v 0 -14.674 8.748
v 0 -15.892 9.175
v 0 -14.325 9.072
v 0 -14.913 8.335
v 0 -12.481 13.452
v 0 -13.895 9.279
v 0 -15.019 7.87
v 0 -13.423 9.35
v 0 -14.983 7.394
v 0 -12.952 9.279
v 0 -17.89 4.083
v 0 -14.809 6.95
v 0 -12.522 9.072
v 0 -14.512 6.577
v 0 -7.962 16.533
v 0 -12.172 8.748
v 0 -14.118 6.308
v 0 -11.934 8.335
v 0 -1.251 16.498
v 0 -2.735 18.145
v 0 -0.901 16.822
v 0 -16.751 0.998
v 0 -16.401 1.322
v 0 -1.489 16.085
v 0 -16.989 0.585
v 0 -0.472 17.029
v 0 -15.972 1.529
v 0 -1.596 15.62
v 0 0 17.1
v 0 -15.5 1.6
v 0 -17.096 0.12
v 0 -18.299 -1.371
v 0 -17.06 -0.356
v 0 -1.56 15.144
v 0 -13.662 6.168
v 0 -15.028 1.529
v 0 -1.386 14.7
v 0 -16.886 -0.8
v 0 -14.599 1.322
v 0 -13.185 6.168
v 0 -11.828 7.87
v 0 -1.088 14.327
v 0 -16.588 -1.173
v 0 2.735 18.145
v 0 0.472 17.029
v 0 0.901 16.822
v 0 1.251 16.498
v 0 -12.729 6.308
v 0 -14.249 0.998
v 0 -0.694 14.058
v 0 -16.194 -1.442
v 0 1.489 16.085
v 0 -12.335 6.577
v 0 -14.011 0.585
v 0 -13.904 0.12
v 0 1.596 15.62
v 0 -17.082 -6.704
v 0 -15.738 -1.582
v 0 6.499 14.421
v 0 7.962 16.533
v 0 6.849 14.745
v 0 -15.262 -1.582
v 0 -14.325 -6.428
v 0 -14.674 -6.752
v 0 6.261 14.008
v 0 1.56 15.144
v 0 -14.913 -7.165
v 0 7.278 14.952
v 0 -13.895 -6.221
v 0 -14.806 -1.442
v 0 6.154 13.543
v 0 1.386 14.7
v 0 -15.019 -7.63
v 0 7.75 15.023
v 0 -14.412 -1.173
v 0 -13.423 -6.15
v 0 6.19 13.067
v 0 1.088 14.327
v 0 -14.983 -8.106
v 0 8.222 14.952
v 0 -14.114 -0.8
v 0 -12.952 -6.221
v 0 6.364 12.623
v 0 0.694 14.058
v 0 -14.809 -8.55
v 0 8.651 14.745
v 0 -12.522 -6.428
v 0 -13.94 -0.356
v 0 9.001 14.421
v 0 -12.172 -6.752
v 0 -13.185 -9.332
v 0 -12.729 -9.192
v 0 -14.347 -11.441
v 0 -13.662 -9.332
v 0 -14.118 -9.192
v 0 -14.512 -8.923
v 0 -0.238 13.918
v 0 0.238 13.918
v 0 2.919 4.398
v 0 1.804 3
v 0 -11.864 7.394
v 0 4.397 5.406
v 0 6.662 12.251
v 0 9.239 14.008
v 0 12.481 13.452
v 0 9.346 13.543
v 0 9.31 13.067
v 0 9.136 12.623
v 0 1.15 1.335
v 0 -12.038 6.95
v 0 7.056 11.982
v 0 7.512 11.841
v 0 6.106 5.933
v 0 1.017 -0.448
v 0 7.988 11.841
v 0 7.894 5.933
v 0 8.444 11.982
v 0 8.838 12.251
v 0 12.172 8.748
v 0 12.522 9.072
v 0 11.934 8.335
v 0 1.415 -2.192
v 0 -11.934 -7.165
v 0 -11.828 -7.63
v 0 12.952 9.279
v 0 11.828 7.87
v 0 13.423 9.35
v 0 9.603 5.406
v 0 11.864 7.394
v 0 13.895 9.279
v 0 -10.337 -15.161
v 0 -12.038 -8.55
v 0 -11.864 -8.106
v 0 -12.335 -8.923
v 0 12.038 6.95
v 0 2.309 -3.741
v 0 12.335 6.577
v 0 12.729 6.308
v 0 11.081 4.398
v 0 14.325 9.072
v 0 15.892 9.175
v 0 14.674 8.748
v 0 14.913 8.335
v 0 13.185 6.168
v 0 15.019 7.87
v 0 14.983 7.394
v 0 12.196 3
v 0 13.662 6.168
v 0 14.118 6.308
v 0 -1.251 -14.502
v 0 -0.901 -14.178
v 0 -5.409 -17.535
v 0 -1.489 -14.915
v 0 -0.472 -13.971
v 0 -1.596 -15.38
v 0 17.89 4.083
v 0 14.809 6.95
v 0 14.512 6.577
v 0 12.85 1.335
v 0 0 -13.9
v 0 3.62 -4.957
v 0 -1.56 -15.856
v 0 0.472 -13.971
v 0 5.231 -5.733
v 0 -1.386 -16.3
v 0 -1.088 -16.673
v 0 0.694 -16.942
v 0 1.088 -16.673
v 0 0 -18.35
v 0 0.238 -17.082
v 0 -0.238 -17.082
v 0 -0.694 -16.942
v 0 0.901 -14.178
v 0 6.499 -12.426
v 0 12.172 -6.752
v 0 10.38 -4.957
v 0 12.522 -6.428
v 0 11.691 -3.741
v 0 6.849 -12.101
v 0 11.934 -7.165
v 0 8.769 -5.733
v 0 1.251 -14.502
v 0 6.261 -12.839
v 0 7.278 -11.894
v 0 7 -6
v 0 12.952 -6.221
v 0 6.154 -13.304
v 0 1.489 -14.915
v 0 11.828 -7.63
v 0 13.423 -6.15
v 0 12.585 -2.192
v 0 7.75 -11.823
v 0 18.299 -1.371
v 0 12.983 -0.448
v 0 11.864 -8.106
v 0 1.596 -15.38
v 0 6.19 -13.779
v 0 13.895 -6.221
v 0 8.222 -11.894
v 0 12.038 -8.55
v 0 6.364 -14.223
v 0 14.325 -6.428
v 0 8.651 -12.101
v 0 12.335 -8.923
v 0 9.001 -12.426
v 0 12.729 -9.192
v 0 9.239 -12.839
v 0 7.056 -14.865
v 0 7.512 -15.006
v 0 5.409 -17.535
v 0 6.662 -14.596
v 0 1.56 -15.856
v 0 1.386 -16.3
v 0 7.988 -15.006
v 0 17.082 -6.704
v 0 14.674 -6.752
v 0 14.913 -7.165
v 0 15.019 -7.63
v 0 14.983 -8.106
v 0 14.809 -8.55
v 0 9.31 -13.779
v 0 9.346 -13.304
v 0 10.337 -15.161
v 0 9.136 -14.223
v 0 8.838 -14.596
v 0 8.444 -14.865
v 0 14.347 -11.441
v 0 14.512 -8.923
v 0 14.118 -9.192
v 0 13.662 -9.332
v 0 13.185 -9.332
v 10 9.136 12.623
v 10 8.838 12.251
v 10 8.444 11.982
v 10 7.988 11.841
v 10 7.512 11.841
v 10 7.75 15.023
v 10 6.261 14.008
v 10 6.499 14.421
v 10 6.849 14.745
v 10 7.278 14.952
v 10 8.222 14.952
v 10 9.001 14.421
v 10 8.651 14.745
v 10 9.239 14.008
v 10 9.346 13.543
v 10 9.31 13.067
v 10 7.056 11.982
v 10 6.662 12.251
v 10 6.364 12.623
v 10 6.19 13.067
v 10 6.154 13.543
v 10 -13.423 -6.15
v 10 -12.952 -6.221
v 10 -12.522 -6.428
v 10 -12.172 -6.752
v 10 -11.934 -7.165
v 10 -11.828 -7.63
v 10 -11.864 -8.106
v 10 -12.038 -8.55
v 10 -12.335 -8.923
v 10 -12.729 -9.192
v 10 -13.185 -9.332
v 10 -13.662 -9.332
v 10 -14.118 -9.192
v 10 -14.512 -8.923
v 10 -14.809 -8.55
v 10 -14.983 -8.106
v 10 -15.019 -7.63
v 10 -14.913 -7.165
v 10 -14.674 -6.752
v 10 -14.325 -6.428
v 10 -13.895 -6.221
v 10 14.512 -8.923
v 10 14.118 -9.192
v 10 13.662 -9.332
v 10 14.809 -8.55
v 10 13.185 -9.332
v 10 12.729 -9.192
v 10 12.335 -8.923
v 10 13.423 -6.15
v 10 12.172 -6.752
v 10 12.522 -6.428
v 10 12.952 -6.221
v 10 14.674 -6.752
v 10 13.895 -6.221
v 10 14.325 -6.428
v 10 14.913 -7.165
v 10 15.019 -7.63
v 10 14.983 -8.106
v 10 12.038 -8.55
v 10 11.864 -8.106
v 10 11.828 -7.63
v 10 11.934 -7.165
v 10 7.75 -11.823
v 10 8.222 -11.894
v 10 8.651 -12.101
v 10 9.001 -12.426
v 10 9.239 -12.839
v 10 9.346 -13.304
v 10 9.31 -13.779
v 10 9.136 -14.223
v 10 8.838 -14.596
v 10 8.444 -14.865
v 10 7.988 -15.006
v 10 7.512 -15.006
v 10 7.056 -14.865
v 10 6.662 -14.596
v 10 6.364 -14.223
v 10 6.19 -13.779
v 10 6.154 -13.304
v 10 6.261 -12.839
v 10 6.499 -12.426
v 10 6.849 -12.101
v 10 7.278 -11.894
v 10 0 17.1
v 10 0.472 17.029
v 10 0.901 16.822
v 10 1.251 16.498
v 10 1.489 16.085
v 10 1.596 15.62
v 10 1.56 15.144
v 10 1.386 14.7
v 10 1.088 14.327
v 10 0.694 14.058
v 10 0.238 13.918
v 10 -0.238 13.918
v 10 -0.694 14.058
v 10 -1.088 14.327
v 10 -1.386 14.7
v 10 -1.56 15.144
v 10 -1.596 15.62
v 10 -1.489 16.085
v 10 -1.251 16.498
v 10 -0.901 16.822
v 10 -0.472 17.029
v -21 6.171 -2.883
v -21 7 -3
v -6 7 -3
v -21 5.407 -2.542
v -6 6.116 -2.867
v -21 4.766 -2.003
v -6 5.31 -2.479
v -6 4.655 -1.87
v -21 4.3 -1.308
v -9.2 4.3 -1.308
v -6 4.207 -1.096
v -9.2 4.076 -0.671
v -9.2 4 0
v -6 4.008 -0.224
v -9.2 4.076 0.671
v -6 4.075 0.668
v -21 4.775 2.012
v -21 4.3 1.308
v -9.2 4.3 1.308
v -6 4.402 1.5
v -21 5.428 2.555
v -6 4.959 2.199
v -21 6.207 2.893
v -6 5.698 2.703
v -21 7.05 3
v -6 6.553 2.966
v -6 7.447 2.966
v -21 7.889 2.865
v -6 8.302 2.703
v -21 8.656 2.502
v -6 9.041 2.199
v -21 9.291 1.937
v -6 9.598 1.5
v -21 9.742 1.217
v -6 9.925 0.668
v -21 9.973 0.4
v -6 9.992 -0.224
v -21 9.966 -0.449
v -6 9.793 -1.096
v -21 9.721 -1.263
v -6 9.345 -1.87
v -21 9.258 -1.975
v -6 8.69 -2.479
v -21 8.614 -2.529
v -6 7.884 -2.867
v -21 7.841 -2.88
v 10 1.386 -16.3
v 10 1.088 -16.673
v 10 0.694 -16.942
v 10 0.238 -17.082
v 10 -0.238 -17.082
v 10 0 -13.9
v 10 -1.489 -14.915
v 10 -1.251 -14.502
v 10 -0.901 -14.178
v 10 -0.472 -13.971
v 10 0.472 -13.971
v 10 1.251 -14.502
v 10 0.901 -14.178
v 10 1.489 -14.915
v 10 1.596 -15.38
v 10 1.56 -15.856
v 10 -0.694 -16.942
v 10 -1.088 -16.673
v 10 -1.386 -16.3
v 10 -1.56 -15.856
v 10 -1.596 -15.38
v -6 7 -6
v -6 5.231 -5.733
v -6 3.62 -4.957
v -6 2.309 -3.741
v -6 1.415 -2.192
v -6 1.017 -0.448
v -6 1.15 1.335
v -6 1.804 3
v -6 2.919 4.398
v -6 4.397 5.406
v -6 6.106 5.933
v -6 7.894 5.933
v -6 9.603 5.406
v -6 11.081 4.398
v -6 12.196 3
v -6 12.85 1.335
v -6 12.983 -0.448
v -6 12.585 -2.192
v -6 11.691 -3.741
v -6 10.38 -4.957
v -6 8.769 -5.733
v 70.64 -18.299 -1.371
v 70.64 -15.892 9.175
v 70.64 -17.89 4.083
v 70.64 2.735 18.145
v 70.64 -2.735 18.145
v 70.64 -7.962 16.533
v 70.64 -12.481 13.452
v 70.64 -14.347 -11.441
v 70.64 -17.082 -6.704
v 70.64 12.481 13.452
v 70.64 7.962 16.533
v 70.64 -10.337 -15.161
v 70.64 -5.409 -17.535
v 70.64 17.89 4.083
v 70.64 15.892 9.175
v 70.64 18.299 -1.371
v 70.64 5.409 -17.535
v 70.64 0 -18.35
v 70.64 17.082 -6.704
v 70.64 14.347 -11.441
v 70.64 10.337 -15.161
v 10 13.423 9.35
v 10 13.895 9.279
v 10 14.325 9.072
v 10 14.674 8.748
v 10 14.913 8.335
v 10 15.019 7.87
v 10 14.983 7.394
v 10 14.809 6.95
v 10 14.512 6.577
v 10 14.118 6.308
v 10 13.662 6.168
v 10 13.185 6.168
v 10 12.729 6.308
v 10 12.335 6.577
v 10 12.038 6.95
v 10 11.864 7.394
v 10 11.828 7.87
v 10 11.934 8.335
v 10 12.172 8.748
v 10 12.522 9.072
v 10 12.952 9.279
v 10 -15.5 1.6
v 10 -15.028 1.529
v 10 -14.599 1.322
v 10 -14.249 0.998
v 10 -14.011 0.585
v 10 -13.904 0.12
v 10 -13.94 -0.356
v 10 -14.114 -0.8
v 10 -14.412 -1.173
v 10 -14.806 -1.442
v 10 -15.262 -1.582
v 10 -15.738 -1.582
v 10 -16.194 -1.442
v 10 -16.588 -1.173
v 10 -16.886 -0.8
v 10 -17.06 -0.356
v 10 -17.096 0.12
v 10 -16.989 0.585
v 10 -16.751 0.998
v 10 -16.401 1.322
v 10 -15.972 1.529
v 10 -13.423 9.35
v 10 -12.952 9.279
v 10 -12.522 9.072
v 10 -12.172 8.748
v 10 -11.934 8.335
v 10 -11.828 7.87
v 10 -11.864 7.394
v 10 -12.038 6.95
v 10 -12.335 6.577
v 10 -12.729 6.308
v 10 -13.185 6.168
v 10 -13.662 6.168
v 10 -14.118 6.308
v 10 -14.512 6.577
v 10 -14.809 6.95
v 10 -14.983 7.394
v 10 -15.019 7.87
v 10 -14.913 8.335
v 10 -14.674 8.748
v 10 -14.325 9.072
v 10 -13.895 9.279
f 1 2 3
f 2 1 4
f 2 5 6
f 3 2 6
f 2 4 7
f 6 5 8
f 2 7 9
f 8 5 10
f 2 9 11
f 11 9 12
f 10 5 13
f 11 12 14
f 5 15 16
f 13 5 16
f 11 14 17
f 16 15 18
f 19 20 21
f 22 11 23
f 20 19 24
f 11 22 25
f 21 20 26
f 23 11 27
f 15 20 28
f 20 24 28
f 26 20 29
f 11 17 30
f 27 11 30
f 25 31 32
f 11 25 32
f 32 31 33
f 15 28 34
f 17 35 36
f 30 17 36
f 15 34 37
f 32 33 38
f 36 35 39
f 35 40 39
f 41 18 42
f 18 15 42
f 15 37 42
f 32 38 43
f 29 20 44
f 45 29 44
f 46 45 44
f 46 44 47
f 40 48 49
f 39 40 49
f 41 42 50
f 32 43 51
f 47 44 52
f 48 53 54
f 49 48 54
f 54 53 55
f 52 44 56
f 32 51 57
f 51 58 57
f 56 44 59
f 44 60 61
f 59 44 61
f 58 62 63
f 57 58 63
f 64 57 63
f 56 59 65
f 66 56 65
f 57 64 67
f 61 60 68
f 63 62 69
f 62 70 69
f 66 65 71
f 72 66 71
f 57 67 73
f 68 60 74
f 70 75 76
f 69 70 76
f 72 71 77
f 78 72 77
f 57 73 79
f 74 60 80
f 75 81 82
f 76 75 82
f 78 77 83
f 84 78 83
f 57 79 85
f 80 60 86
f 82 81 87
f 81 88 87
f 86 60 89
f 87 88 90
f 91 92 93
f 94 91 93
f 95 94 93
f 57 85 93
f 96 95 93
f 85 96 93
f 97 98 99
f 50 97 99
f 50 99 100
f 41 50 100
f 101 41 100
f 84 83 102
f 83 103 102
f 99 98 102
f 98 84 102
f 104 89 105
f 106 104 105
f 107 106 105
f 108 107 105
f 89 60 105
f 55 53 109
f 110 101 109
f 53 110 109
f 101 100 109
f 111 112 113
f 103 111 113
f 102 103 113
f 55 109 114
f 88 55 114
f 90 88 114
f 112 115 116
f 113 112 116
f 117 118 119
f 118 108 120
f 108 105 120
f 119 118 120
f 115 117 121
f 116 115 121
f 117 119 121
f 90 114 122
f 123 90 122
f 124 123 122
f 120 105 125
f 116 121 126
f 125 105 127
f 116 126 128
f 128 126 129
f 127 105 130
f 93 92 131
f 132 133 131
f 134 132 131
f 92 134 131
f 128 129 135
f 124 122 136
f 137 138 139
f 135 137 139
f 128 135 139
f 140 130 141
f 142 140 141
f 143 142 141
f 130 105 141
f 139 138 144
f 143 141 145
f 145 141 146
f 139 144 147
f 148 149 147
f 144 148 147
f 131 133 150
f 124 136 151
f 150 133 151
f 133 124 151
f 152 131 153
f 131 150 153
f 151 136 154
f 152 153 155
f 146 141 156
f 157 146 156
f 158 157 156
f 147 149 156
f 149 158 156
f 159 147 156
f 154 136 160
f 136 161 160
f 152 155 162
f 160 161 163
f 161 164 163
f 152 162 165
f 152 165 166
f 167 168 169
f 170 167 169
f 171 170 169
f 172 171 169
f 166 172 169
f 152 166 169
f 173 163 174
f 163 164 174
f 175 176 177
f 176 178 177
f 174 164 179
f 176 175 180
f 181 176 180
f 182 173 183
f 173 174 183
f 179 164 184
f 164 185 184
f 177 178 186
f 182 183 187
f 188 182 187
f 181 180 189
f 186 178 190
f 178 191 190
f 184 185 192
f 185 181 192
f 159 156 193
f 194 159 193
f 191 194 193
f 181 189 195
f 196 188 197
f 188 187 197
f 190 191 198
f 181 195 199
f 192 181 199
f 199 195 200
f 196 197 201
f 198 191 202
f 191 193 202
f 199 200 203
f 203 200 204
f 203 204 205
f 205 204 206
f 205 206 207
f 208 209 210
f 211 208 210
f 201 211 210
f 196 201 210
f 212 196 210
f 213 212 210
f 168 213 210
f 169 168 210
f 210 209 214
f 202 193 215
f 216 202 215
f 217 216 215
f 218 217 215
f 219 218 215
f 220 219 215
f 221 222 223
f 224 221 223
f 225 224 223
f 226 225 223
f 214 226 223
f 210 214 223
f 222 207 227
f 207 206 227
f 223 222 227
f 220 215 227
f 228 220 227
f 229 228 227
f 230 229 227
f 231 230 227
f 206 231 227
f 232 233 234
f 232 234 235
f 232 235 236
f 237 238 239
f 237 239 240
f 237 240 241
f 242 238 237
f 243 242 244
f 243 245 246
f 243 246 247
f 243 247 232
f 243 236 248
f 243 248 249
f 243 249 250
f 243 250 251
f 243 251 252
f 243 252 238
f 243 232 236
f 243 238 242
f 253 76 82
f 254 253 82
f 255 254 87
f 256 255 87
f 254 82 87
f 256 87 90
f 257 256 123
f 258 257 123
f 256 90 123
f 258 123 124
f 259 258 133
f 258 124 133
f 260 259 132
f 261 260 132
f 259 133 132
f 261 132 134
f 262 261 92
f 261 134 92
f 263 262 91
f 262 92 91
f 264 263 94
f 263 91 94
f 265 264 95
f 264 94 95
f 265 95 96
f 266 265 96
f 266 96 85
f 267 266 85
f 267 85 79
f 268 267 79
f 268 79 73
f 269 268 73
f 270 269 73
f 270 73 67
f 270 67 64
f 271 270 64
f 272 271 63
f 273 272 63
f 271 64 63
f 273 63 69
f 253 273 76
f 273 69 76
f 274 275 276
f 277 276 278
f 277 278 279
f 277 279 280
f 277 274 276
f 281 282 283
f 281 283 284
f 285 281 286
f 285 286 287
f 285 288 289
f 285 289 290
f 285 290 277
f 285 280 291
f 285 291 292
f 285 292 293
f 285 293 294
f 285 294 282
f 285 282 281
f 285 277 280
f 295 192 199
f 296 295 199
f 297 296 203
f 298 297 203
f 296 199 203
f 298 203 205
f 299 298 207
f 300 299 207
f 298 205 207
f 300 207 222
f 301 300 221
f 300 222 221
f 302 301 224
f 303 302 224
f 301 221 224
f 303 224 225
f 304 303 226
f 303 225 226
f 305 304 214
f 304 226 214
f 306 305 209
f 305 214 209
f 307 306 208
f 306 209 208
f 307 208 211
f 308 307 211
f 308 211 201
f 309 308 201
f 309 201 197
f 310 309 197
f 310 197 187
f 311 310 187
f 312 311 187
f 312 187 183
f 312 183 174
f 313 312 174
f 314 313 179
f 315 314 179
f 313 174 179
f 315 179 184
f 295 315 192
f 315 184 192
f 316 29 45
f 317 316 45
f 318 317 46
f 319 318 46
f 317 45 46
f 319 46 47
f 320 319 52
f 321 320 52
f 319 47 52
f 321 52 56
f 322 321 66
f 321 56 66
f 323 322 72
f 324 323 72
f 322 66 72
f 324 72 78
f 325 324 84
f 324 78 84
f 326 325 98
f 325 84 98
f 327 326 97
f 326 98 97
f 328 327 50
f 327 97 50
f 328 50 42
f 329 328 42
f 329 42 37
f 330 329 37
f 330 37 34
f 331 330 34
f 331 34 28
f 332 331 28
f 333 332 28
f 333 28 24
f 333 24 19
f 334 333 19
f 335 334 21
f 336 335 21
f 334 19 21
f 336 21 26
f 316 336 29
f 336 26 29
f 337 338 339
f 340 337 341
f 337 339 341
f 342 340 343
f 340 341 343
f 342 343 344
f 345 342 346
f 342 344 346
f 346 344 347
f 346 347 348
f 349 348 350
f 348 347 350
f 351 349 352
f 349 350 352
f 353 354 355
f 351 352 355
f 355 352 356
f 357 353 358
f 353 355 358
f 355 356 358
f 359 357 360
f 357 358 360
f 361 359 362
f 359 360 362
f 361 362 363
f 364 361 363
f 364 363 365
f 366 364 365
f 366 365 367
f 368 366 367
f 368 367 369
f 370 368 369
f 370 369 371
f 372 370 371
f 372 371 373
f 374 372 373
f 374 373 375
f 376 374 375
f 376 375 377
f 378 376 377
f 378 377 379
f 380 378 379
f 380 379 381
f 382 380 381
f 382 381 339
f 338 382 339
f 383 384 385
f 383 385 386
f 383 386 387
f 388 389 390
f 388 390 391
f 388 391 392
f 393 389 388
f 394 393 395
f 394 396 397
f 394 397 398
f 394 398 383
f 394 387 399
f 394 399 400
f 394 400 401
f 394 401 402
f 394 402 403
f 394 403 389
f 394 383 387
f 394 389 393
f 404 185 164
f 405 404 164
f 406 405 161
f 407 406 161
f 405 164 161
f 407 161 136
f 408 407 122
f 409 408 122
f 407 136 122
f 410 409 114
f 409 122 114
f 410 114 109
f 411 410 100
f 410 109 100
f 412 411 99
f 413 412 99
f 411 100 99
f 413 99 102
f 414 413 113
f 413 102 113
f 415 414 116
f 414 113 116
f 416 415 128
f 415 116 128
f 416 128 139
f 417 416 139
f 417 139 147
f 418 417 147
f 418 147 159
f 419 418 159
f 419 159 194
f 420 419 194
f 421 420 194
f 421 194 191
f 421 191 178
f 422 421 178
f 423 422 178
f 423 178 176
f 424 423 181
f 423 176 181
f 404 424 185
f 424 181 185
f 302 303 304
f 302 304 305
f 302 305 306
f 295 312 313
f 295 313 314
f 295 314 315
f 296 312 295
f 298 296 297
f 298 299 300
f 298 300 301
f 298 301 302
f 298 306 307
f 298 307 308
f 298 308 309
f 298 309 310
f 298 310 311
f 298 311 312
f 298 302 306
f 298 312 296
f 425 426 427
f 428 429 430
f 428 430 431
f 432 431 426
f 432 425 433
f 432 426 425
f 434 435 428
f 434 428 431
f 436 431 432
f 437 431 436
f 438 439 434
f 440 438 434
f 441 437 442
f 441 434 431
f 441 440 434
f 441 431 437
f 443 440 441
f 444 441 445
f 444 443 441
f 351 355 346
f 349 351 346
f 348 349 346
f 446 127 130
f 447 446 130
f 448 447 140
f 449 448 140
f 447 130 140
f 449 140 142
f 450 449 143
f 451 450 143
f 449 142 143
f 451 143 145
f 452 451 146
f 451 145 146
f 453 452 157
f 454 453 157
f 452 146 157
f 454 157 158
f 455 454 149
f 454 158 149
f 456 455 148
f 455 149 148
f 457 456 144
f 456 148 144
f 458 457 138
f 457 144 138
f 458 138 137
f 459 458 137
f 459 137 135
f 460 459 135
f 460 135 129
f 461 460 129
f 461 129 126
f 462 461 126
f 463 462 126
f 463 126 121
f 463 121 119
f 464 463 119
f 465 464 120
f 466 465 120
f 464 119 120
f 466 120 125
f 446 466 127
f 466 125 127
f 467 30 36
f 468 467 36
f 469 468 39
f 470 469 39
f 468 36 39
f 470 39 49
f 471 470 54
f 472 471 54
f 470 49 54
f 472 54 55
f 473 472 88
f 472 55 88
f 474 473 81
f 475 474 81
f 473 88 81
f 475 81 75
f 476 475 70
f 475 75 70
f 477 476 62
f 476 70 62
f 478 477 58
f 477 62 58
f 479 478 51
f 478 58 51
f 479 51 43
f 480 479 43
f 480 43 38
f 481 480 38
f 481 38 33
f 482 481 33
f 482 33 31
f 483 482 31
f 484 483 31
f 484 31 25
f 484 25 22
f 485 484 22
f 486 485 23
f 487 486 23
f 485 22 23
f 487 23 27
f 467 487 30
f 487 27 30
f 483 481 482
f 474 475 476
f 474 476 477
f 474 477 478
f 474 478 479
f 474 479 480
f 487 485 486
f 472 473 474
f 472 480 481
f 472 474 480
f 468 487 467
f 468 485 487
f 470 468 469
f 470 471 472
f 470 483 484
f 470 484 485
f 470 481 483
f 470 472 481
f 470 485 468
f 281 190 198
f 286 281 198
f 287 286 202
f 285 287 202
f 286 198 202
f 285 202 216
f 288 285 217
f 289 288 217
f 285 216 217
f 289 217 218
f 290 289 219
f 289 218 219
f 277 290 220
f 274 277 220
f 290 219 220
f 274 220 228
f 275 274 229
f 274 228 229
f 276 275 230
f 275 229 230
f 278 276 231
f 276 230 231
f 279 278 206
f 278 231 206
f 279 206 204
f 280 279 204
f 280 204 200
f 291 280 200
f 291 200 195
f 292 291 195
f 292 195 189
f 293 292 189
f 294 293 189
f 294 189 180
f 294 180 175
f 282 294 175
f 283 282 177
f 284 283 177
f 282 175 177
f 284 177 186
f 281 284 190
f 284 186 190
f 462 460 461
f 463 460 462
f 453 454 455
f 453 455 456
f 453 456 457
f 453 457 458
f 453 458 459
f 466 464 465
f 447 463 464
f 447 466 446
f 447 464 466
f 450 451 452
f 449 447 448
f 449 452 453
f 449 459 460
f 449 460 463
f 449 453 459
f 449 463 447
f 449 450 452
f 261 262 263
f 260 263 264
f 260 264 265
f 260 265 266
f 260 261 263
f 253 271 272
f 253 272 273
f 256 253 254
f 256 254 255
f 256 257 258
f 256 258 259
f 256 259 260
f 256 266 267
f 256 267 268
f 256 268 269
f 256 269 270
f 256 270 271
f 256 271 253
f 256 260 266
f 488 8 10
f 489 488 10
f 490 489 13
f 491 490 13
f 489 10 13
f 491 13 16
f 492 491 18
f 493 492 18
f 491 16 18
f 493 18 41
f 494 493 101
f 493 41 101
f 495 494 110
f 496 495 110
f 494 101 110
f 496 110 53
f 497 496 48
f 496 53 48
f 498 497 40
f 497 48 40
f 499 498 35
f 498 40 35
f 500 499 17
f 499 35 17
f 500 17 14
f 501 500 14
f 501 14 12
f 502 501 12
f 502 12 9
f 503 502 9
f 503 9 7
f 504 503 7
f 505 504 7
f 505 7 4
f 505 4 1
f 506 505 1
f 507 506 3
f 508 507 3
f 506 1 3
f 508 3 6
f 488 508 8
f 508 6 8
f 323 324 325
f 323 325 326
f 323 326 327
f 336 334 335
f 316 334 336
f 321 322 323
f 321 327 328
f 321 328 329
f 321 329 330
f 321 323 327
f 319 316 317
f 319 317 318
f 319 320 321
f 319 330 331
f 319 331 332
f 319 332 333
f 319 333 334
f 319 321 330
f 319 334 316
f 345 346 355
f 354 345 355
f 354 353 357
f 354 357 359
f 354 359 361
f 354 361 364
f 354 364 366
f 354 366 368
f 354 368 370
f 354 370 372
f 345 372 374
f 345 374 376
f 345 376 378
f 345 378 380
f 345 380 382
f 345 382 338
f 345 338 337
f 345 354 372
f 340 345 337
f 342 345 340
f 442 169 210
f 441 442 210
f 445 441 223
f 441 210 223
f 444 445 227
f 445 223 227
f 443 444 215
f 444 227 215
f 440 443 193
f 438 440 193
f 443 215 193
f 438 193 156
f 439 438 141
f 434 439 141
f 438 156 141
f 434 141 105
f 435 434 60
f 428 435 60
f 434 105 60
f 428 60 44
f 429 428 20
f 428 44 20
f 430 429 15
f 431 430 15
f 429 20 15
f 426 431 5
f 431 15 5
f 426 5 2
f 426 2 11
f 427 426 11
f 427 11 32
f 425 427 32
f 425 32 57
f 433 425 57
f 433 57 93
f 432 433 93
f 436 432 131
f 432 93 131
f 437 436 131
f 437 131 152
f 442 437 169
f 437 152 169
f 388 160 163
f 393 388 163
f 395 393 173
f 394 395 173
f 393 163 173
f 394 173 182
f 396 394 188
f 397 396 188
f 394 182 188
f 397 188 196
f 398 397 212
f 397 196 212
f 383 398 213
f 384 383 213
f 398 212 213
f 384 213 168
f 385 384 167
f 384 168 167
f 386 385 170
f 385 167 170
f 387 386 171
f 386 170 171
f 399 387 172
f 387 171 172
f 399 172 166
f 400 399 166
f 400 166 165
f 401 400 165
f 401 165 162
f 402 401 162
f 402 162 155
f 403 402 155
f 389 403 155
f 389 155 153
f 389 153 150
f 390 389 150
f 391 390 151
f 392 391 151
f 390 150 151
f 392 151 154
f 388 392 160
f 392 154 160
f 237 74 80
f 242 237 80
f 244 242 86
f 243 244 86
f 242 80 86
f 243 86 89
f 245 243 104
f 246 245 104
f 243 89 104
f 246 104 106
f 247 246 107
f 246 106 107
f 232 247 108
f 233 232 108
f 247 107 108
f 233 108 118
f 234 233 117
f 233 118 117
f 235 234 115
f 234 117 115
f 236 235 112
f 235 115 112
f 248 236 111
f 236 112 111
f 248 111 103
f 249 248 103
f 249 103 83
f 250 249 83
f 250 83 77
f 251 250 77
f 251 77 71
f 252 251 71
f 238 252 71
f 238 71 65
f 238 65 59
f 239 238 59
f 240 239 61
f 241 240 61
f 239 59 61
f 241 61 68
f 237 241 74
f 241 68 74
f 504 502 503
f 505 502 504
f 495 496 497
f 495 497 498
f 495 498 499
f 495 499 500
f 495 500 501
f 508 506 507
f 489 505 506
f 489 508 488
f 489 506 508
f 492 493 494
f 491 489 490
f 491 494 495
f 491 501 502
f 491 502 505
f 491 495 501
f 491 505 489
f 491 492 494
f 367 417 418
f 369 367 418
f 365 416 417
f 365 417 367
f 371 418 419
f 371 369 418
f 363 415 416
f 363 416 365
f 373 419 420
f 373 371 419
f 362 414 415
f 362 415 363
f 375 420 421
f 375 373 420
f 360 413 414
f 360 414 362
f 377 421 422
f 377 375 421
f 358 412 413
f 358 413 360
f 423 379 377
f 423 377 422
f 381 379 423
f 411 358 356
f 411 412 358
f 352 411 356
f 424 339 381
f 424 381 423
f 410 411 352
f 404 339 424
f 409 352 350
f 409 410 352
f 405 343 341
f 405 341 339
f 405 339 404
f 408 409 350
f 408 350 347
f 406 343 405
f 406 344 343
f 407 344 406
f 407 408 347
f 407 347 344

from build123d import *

# Parameters (mm, degrees)
ESQUISSE1_R             = 18.35
BOSS_EXTRU_1_DEPTH      = 70.64
ESQUISSE11_R            = 1.6
ENL_V_MAT_EXTRU_1_DEPTH = 10
ESQUISSE12_R            = 3
BOSS_EXTRU_2_DEPTH      = 21
ESQUISSE13_R            = 6
BOSS_EXTRU_3_DEPTH      = 6
ENL_V_START             = -11.8
ENL_V_MAT_EXTRU_2_DEPTH = 11.8


with BuildPart() as part:
    # Esquisse1 → Boss.-Extru.1 (new body)
    with BuildSketch(Plane(origin=(0, 0, 0), x_dir=(0, 0, -1), z_dir=(1, 0, 0))):
        Circle(ESQUISSE1_R)
    extrude(amount=BOSS_EXTRU_1_DEPTH)

    # Esquisse11 → Enlèv. mat.-Extru.1 (cut)
    with BuildSketch(Plane.ZY):
        with Locations((0, -15.5)):
            Circle(ESQUISSE11_R)
        with Locations((-7.75, -13.423393759)):
            Circle(ESQUISSE11_R)
        with Locations((-15.5, 0)):
            Circle(ESQUISSE11_R)
        with Locations((-13.423393759, 7.75)):
            Circle(ESQUISSE11_R)
        with Locations((-7.75, 13.423393759)):
            Circle(ESQUISSE11_R)
        with Locations((7.75, 13.423393759)):
            Circle(ESQUISSE11_R)
        with Locations((13.423393759, 7.75)):
            Circle(ESQUISSE11_R)
        with Locations((15.5, 0)):
            Circle(ESQUISSE11_R)
        with Locations((7.75, -13.423393759)):
            Circle(ESQUISSE11_R)
    extrude(amount=-ENL_V_MAT_EXTRU_1_DEPTH, mode=Mode.SUBTRACT)

    # Esquisse12 → Boss.-Extru.2 (add)
    with BuildSketch(Plane.ZY):
        with Locations(Location((0, 7, 0), (0, 0, 180))):
            Circle(ESQUISSE12_R)
    extrude(amount=BOSS_EXTRU_2_DEPTH)

    # Esquisse13 → Boss.-Extru.3 (add)
    with BuildSketch(Plane.ZY):
        with Locations(Location((0, 7, 0), (0, 0, 180))):
            Circle(ESQUISSE13_R)
    extrude(amount=BOSS_EXTRU_3_DEPTH)

    # Esquisse14 → Enlèv. mat.-Extru.2 (cut)
    with BuildSketch(Plane.ZY.offset(21).offset(ENL_V_START)):
        with BuildLine():
            Line((-1.307669683, 4.3), (1.307669683, 4.3))
            ThreePointArc((1.307669683, 4.3), (0, 4), (-1.307669683, 4.3))
        make_face()
    extrude(amount=ENL_V_MAT_EXTRU_2_DEPTH, mode=Mode.SUBTRACT)


solid = part.part
